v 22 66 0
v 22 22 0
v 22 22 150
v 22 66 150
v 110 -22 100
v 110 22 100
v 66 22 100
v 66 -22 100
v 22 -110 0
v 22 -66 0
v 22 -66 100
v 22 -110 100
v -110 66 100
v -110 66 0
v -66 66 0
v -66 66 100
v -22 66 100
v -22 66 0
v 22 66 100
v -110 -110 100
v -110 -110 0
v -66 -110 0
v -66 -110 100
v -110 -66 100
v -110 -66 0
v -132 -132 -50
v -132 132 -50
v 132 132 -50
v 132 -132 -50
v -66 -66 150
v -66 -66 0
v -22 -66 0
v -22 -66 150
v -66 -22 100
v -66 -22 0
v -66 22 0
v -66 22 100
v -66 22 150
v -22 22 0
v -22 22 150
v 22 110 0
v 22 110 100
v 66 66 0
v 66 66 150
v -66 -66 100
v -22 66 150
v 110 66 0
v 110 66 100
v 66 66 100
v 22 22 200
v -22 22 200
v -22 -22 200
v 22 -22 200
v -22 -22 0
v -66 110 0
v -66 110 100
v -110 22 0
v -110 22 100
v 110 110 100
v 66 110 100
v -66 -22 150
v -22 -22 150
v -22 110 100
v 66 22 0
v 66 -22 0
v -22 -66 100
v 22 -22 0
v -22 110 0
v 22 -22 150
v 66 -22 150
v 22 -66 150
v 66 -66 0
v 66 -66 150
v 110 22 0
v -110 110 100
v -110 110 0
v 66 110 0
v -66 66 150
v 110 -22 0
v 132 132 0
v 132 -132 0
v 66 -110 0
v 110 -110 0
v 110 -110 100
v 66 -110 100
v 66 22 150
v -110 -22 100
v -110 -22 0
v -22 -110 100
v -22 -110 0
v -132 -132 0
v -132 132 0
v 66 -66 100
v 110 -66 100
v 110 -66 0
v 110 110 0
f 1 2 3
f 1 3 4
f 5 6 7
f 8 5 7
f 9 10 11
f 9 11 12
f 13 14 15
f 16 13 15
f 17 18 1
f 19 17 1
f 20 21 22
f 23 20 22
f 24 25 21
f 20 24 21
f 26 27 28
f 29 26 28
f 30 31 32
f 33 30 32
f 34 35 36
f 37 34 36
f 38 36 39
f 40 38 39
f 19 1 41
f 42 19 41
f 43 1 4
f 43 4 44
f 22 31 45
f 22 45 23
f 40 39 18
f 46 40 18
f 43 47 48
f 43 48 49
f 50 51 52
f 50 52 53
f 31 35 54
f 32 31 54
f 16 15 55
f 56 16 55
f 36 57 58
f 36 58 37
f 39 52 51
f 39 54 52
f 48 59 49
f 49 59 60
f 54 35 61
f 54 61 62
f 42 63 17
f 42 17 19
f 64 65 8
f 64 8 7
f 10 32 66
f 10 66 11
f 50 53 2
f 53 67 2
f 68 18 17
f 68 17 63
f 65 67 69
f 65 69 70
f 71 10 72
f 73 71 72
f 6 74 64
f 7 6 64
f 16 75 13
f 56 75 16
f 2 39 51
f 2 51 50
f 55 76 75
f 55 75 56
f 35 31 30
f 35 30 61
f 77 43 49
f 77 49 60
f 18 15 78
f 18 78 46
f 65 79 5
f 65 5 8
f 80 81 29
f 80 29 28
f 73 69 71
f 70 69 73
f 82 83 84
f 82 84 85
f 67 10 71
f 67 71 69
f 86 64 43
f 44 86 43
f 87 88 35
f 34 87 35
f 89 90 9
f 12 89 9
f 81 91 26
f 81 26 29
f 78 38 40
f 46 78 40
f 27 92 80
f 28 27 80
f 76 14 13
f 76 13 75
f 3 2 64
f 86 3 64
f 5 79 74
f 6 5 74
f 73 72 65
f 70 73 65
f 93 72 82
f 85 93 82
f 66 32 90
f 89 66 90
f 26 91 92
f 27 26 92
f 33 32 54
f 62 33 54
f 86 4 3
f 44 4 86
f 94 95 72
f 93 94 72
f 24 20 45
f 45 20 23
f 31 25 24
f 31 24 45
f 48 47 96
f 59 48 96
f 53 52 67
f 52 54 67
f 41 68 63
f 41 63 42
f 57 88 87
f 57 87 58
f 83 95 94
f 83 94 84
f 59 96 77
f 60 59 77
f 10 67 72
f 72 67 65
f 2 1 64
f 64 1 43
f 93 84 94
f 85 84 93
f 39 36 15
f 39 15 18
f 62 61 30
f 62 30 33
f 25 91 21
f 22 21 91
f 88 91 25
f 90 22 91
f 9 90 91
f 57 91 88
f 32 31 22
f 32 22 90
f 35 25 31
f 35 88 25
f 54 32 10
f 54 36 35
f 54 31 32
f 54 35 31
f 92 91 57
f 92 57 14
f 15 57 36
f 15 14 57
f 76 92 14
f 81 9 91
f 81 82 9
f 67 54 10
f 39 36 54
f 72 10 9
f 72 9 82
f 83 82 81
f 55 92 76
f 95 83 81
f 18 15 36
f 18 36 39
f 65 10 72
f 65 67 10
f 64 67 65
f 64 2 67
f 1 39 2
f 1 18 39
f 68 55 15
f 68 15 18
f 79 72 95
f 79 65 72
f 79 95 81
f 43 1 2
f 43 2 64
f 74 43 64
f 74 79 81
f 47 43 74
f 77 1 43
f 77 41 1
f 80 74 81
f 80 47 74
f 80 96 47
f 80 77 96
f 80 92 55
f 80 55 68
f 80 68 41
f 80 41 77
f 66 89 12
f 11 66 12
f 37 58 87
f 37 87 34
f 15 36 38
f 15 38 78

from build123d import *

# Parameters (mm, degrees)
F0_W     = 44
F0_H     = 44
F1_DEPTH = 100
F0_W_2   = 264
F0_H_2   = 264
F4_DEPTH = 50
F5_W     = 44
F5_H     = 44
F6_DEPTH = 150
F7_DEPTH = 100


# Not quite as in the source:
# - a feature names something its author has since deleted; it is built from what else it names


with BuildPart() as f1:
    # F0 (on Top) → F1 (new body)
    with BuildSketch(Plane.XY):
        with Locations((-88, 0)):
            Rectangle(F0_W, F0_H)
    extrude(amount=F1_DEPTH)


with BuildPart() as f1b:
    # F0 (on Top) → F1, piece 2 (new body)
    with BuildSketch(Plane.XY):
        with Locations((-88, 88)):
            Rectangle(F0_W, F0_H)
    extrude(amount=F1_DEPTH)


with BuildPart() as f1c:
    # F0 (on Top) → F1, piece 3 (new body)
    with BuildSketch(Plane.XY):
        with Locations((0, 88)):
            Rectangle(F0_W, F0_H)
    extrude(amount=F1_DEPTH)


with BuildPart() as f1d:
    # F0 (on Top) → F1, piece 4 (new body)
    with BuildSketch(Plane.XY):
        Rectangle(F0_W, F0_H)
    extrude(amount=F1_DEPTH)


with BuildPart() as f2_1:
    # F2: instance of F1
    add(f1.part.mirror(Plane.YZ))


with BuildPart() as f2_2:
    # F2: instance of F1b
    add(f1b.part.mirror(Plane.YZ))


with BuildPart() as f3_1:
    # F3: instance of F1b
    add(f1b.part.mirror(Plane.XZ))


with BuildPart() as f3_2:
    # F3: instance of F1c
    add(f1c.part.mirror(Plane.XZ))


with BuildPart() as f3_3:
    # F3: instance of F2_2
    add(f2_2.part.mirror(Plane.XZ))


with BuildPart() as f1_1:
    add(f1.part)

    add(f1b.part)  # F4 merges F1b

    add(f1c.part)  # F4 merges F1c

    add(f1d.part)  # F4 merges F1d

    add(f2_1.part)  # F4 merges F2_1

    add(f2_2.part)  # F4 merges F2_2

    add(f3_1.part)  # F4 merges F3_1

    add(f3_2.part)  # F4 merges F3_2

    add(f3_3.part)  # F4 merges F3_3
    # F0 (on Top) → F4 (join)
    with BuildSketch(Plane.XY):
        Rectangle(F0_W_2, F0_H_2)
        with Locations((-88, 0)):
            Rectangle(F0_W, F0_H, mode=Mode.SUBTRACT)
        with Locations((-88, 88)):
            Rectangle(F0_W, F0_H, mode=Mode.SUBTRACT)
        Rectangle(F0_W, F0_H, mode=Mode.SUBTRACT)
        with Locations((0, 88)):
            Rectangle(F0_W, F0_H, mode=Mode.SUBTRACT)
        with Locations((-88, 0)):
            Rectangle(F0_W, F0_H)
        Rectangle(F0_W, F0_H)
        with Locations((-88, 88)):
            Rectangle(F0_W, F0_H)
        with Locations((0, 88)):
            Rectangle(F0_W, F0_H)
    extrude(amount=-F4_DEPTH)

    # F7 (add): a face of the model
    f7_faces = [f1_1.faces().sort_by_distance(p)[0] for p in [
        (0, 0, 100),
    ]]
    extrude(f7_faces, amount=F7_DEPTH)


with BuildPart() as f6:
    # F5 (on face) → F6 (new body)
    with BuildSketch(Plane.XY):
        with Locations((-44, 44)):
            Rectangle(F5_W, F5_H)
    extrude(amount=F6_DEPTH)


with BuildPart() as f6b:
    # F5 (on face) → F6, piece 2 (new body)
    with BuildSketch(Plane.XY):
        with Locations((44, 44)):
            Rectangle(F5_W, F5_H)
    extrude(amount=F6_DEPTH)


with BuildPart() as f6c:
    # F5 (on face) → F6, piece 3 (new body)
    with BuildSketch(Plane.XY):
        with Locations((44, -44)):
            Rectangle(F5_W, F5_H)
    extrude(amount=F6_DEPTH)


with BuildPart() as f6d:
    # F5 (on face) → F6, piece 4 (new body)
    with BuildSketch(Plane.XY):
        with Locations((-44, -44)):
            Rectangle(F5_W, F5_H)
    extrude(amount=F6_DEPTH)


solid = Compound([f1_1.part, f6.part, f6b.part, f6c.part, f6d.part])
